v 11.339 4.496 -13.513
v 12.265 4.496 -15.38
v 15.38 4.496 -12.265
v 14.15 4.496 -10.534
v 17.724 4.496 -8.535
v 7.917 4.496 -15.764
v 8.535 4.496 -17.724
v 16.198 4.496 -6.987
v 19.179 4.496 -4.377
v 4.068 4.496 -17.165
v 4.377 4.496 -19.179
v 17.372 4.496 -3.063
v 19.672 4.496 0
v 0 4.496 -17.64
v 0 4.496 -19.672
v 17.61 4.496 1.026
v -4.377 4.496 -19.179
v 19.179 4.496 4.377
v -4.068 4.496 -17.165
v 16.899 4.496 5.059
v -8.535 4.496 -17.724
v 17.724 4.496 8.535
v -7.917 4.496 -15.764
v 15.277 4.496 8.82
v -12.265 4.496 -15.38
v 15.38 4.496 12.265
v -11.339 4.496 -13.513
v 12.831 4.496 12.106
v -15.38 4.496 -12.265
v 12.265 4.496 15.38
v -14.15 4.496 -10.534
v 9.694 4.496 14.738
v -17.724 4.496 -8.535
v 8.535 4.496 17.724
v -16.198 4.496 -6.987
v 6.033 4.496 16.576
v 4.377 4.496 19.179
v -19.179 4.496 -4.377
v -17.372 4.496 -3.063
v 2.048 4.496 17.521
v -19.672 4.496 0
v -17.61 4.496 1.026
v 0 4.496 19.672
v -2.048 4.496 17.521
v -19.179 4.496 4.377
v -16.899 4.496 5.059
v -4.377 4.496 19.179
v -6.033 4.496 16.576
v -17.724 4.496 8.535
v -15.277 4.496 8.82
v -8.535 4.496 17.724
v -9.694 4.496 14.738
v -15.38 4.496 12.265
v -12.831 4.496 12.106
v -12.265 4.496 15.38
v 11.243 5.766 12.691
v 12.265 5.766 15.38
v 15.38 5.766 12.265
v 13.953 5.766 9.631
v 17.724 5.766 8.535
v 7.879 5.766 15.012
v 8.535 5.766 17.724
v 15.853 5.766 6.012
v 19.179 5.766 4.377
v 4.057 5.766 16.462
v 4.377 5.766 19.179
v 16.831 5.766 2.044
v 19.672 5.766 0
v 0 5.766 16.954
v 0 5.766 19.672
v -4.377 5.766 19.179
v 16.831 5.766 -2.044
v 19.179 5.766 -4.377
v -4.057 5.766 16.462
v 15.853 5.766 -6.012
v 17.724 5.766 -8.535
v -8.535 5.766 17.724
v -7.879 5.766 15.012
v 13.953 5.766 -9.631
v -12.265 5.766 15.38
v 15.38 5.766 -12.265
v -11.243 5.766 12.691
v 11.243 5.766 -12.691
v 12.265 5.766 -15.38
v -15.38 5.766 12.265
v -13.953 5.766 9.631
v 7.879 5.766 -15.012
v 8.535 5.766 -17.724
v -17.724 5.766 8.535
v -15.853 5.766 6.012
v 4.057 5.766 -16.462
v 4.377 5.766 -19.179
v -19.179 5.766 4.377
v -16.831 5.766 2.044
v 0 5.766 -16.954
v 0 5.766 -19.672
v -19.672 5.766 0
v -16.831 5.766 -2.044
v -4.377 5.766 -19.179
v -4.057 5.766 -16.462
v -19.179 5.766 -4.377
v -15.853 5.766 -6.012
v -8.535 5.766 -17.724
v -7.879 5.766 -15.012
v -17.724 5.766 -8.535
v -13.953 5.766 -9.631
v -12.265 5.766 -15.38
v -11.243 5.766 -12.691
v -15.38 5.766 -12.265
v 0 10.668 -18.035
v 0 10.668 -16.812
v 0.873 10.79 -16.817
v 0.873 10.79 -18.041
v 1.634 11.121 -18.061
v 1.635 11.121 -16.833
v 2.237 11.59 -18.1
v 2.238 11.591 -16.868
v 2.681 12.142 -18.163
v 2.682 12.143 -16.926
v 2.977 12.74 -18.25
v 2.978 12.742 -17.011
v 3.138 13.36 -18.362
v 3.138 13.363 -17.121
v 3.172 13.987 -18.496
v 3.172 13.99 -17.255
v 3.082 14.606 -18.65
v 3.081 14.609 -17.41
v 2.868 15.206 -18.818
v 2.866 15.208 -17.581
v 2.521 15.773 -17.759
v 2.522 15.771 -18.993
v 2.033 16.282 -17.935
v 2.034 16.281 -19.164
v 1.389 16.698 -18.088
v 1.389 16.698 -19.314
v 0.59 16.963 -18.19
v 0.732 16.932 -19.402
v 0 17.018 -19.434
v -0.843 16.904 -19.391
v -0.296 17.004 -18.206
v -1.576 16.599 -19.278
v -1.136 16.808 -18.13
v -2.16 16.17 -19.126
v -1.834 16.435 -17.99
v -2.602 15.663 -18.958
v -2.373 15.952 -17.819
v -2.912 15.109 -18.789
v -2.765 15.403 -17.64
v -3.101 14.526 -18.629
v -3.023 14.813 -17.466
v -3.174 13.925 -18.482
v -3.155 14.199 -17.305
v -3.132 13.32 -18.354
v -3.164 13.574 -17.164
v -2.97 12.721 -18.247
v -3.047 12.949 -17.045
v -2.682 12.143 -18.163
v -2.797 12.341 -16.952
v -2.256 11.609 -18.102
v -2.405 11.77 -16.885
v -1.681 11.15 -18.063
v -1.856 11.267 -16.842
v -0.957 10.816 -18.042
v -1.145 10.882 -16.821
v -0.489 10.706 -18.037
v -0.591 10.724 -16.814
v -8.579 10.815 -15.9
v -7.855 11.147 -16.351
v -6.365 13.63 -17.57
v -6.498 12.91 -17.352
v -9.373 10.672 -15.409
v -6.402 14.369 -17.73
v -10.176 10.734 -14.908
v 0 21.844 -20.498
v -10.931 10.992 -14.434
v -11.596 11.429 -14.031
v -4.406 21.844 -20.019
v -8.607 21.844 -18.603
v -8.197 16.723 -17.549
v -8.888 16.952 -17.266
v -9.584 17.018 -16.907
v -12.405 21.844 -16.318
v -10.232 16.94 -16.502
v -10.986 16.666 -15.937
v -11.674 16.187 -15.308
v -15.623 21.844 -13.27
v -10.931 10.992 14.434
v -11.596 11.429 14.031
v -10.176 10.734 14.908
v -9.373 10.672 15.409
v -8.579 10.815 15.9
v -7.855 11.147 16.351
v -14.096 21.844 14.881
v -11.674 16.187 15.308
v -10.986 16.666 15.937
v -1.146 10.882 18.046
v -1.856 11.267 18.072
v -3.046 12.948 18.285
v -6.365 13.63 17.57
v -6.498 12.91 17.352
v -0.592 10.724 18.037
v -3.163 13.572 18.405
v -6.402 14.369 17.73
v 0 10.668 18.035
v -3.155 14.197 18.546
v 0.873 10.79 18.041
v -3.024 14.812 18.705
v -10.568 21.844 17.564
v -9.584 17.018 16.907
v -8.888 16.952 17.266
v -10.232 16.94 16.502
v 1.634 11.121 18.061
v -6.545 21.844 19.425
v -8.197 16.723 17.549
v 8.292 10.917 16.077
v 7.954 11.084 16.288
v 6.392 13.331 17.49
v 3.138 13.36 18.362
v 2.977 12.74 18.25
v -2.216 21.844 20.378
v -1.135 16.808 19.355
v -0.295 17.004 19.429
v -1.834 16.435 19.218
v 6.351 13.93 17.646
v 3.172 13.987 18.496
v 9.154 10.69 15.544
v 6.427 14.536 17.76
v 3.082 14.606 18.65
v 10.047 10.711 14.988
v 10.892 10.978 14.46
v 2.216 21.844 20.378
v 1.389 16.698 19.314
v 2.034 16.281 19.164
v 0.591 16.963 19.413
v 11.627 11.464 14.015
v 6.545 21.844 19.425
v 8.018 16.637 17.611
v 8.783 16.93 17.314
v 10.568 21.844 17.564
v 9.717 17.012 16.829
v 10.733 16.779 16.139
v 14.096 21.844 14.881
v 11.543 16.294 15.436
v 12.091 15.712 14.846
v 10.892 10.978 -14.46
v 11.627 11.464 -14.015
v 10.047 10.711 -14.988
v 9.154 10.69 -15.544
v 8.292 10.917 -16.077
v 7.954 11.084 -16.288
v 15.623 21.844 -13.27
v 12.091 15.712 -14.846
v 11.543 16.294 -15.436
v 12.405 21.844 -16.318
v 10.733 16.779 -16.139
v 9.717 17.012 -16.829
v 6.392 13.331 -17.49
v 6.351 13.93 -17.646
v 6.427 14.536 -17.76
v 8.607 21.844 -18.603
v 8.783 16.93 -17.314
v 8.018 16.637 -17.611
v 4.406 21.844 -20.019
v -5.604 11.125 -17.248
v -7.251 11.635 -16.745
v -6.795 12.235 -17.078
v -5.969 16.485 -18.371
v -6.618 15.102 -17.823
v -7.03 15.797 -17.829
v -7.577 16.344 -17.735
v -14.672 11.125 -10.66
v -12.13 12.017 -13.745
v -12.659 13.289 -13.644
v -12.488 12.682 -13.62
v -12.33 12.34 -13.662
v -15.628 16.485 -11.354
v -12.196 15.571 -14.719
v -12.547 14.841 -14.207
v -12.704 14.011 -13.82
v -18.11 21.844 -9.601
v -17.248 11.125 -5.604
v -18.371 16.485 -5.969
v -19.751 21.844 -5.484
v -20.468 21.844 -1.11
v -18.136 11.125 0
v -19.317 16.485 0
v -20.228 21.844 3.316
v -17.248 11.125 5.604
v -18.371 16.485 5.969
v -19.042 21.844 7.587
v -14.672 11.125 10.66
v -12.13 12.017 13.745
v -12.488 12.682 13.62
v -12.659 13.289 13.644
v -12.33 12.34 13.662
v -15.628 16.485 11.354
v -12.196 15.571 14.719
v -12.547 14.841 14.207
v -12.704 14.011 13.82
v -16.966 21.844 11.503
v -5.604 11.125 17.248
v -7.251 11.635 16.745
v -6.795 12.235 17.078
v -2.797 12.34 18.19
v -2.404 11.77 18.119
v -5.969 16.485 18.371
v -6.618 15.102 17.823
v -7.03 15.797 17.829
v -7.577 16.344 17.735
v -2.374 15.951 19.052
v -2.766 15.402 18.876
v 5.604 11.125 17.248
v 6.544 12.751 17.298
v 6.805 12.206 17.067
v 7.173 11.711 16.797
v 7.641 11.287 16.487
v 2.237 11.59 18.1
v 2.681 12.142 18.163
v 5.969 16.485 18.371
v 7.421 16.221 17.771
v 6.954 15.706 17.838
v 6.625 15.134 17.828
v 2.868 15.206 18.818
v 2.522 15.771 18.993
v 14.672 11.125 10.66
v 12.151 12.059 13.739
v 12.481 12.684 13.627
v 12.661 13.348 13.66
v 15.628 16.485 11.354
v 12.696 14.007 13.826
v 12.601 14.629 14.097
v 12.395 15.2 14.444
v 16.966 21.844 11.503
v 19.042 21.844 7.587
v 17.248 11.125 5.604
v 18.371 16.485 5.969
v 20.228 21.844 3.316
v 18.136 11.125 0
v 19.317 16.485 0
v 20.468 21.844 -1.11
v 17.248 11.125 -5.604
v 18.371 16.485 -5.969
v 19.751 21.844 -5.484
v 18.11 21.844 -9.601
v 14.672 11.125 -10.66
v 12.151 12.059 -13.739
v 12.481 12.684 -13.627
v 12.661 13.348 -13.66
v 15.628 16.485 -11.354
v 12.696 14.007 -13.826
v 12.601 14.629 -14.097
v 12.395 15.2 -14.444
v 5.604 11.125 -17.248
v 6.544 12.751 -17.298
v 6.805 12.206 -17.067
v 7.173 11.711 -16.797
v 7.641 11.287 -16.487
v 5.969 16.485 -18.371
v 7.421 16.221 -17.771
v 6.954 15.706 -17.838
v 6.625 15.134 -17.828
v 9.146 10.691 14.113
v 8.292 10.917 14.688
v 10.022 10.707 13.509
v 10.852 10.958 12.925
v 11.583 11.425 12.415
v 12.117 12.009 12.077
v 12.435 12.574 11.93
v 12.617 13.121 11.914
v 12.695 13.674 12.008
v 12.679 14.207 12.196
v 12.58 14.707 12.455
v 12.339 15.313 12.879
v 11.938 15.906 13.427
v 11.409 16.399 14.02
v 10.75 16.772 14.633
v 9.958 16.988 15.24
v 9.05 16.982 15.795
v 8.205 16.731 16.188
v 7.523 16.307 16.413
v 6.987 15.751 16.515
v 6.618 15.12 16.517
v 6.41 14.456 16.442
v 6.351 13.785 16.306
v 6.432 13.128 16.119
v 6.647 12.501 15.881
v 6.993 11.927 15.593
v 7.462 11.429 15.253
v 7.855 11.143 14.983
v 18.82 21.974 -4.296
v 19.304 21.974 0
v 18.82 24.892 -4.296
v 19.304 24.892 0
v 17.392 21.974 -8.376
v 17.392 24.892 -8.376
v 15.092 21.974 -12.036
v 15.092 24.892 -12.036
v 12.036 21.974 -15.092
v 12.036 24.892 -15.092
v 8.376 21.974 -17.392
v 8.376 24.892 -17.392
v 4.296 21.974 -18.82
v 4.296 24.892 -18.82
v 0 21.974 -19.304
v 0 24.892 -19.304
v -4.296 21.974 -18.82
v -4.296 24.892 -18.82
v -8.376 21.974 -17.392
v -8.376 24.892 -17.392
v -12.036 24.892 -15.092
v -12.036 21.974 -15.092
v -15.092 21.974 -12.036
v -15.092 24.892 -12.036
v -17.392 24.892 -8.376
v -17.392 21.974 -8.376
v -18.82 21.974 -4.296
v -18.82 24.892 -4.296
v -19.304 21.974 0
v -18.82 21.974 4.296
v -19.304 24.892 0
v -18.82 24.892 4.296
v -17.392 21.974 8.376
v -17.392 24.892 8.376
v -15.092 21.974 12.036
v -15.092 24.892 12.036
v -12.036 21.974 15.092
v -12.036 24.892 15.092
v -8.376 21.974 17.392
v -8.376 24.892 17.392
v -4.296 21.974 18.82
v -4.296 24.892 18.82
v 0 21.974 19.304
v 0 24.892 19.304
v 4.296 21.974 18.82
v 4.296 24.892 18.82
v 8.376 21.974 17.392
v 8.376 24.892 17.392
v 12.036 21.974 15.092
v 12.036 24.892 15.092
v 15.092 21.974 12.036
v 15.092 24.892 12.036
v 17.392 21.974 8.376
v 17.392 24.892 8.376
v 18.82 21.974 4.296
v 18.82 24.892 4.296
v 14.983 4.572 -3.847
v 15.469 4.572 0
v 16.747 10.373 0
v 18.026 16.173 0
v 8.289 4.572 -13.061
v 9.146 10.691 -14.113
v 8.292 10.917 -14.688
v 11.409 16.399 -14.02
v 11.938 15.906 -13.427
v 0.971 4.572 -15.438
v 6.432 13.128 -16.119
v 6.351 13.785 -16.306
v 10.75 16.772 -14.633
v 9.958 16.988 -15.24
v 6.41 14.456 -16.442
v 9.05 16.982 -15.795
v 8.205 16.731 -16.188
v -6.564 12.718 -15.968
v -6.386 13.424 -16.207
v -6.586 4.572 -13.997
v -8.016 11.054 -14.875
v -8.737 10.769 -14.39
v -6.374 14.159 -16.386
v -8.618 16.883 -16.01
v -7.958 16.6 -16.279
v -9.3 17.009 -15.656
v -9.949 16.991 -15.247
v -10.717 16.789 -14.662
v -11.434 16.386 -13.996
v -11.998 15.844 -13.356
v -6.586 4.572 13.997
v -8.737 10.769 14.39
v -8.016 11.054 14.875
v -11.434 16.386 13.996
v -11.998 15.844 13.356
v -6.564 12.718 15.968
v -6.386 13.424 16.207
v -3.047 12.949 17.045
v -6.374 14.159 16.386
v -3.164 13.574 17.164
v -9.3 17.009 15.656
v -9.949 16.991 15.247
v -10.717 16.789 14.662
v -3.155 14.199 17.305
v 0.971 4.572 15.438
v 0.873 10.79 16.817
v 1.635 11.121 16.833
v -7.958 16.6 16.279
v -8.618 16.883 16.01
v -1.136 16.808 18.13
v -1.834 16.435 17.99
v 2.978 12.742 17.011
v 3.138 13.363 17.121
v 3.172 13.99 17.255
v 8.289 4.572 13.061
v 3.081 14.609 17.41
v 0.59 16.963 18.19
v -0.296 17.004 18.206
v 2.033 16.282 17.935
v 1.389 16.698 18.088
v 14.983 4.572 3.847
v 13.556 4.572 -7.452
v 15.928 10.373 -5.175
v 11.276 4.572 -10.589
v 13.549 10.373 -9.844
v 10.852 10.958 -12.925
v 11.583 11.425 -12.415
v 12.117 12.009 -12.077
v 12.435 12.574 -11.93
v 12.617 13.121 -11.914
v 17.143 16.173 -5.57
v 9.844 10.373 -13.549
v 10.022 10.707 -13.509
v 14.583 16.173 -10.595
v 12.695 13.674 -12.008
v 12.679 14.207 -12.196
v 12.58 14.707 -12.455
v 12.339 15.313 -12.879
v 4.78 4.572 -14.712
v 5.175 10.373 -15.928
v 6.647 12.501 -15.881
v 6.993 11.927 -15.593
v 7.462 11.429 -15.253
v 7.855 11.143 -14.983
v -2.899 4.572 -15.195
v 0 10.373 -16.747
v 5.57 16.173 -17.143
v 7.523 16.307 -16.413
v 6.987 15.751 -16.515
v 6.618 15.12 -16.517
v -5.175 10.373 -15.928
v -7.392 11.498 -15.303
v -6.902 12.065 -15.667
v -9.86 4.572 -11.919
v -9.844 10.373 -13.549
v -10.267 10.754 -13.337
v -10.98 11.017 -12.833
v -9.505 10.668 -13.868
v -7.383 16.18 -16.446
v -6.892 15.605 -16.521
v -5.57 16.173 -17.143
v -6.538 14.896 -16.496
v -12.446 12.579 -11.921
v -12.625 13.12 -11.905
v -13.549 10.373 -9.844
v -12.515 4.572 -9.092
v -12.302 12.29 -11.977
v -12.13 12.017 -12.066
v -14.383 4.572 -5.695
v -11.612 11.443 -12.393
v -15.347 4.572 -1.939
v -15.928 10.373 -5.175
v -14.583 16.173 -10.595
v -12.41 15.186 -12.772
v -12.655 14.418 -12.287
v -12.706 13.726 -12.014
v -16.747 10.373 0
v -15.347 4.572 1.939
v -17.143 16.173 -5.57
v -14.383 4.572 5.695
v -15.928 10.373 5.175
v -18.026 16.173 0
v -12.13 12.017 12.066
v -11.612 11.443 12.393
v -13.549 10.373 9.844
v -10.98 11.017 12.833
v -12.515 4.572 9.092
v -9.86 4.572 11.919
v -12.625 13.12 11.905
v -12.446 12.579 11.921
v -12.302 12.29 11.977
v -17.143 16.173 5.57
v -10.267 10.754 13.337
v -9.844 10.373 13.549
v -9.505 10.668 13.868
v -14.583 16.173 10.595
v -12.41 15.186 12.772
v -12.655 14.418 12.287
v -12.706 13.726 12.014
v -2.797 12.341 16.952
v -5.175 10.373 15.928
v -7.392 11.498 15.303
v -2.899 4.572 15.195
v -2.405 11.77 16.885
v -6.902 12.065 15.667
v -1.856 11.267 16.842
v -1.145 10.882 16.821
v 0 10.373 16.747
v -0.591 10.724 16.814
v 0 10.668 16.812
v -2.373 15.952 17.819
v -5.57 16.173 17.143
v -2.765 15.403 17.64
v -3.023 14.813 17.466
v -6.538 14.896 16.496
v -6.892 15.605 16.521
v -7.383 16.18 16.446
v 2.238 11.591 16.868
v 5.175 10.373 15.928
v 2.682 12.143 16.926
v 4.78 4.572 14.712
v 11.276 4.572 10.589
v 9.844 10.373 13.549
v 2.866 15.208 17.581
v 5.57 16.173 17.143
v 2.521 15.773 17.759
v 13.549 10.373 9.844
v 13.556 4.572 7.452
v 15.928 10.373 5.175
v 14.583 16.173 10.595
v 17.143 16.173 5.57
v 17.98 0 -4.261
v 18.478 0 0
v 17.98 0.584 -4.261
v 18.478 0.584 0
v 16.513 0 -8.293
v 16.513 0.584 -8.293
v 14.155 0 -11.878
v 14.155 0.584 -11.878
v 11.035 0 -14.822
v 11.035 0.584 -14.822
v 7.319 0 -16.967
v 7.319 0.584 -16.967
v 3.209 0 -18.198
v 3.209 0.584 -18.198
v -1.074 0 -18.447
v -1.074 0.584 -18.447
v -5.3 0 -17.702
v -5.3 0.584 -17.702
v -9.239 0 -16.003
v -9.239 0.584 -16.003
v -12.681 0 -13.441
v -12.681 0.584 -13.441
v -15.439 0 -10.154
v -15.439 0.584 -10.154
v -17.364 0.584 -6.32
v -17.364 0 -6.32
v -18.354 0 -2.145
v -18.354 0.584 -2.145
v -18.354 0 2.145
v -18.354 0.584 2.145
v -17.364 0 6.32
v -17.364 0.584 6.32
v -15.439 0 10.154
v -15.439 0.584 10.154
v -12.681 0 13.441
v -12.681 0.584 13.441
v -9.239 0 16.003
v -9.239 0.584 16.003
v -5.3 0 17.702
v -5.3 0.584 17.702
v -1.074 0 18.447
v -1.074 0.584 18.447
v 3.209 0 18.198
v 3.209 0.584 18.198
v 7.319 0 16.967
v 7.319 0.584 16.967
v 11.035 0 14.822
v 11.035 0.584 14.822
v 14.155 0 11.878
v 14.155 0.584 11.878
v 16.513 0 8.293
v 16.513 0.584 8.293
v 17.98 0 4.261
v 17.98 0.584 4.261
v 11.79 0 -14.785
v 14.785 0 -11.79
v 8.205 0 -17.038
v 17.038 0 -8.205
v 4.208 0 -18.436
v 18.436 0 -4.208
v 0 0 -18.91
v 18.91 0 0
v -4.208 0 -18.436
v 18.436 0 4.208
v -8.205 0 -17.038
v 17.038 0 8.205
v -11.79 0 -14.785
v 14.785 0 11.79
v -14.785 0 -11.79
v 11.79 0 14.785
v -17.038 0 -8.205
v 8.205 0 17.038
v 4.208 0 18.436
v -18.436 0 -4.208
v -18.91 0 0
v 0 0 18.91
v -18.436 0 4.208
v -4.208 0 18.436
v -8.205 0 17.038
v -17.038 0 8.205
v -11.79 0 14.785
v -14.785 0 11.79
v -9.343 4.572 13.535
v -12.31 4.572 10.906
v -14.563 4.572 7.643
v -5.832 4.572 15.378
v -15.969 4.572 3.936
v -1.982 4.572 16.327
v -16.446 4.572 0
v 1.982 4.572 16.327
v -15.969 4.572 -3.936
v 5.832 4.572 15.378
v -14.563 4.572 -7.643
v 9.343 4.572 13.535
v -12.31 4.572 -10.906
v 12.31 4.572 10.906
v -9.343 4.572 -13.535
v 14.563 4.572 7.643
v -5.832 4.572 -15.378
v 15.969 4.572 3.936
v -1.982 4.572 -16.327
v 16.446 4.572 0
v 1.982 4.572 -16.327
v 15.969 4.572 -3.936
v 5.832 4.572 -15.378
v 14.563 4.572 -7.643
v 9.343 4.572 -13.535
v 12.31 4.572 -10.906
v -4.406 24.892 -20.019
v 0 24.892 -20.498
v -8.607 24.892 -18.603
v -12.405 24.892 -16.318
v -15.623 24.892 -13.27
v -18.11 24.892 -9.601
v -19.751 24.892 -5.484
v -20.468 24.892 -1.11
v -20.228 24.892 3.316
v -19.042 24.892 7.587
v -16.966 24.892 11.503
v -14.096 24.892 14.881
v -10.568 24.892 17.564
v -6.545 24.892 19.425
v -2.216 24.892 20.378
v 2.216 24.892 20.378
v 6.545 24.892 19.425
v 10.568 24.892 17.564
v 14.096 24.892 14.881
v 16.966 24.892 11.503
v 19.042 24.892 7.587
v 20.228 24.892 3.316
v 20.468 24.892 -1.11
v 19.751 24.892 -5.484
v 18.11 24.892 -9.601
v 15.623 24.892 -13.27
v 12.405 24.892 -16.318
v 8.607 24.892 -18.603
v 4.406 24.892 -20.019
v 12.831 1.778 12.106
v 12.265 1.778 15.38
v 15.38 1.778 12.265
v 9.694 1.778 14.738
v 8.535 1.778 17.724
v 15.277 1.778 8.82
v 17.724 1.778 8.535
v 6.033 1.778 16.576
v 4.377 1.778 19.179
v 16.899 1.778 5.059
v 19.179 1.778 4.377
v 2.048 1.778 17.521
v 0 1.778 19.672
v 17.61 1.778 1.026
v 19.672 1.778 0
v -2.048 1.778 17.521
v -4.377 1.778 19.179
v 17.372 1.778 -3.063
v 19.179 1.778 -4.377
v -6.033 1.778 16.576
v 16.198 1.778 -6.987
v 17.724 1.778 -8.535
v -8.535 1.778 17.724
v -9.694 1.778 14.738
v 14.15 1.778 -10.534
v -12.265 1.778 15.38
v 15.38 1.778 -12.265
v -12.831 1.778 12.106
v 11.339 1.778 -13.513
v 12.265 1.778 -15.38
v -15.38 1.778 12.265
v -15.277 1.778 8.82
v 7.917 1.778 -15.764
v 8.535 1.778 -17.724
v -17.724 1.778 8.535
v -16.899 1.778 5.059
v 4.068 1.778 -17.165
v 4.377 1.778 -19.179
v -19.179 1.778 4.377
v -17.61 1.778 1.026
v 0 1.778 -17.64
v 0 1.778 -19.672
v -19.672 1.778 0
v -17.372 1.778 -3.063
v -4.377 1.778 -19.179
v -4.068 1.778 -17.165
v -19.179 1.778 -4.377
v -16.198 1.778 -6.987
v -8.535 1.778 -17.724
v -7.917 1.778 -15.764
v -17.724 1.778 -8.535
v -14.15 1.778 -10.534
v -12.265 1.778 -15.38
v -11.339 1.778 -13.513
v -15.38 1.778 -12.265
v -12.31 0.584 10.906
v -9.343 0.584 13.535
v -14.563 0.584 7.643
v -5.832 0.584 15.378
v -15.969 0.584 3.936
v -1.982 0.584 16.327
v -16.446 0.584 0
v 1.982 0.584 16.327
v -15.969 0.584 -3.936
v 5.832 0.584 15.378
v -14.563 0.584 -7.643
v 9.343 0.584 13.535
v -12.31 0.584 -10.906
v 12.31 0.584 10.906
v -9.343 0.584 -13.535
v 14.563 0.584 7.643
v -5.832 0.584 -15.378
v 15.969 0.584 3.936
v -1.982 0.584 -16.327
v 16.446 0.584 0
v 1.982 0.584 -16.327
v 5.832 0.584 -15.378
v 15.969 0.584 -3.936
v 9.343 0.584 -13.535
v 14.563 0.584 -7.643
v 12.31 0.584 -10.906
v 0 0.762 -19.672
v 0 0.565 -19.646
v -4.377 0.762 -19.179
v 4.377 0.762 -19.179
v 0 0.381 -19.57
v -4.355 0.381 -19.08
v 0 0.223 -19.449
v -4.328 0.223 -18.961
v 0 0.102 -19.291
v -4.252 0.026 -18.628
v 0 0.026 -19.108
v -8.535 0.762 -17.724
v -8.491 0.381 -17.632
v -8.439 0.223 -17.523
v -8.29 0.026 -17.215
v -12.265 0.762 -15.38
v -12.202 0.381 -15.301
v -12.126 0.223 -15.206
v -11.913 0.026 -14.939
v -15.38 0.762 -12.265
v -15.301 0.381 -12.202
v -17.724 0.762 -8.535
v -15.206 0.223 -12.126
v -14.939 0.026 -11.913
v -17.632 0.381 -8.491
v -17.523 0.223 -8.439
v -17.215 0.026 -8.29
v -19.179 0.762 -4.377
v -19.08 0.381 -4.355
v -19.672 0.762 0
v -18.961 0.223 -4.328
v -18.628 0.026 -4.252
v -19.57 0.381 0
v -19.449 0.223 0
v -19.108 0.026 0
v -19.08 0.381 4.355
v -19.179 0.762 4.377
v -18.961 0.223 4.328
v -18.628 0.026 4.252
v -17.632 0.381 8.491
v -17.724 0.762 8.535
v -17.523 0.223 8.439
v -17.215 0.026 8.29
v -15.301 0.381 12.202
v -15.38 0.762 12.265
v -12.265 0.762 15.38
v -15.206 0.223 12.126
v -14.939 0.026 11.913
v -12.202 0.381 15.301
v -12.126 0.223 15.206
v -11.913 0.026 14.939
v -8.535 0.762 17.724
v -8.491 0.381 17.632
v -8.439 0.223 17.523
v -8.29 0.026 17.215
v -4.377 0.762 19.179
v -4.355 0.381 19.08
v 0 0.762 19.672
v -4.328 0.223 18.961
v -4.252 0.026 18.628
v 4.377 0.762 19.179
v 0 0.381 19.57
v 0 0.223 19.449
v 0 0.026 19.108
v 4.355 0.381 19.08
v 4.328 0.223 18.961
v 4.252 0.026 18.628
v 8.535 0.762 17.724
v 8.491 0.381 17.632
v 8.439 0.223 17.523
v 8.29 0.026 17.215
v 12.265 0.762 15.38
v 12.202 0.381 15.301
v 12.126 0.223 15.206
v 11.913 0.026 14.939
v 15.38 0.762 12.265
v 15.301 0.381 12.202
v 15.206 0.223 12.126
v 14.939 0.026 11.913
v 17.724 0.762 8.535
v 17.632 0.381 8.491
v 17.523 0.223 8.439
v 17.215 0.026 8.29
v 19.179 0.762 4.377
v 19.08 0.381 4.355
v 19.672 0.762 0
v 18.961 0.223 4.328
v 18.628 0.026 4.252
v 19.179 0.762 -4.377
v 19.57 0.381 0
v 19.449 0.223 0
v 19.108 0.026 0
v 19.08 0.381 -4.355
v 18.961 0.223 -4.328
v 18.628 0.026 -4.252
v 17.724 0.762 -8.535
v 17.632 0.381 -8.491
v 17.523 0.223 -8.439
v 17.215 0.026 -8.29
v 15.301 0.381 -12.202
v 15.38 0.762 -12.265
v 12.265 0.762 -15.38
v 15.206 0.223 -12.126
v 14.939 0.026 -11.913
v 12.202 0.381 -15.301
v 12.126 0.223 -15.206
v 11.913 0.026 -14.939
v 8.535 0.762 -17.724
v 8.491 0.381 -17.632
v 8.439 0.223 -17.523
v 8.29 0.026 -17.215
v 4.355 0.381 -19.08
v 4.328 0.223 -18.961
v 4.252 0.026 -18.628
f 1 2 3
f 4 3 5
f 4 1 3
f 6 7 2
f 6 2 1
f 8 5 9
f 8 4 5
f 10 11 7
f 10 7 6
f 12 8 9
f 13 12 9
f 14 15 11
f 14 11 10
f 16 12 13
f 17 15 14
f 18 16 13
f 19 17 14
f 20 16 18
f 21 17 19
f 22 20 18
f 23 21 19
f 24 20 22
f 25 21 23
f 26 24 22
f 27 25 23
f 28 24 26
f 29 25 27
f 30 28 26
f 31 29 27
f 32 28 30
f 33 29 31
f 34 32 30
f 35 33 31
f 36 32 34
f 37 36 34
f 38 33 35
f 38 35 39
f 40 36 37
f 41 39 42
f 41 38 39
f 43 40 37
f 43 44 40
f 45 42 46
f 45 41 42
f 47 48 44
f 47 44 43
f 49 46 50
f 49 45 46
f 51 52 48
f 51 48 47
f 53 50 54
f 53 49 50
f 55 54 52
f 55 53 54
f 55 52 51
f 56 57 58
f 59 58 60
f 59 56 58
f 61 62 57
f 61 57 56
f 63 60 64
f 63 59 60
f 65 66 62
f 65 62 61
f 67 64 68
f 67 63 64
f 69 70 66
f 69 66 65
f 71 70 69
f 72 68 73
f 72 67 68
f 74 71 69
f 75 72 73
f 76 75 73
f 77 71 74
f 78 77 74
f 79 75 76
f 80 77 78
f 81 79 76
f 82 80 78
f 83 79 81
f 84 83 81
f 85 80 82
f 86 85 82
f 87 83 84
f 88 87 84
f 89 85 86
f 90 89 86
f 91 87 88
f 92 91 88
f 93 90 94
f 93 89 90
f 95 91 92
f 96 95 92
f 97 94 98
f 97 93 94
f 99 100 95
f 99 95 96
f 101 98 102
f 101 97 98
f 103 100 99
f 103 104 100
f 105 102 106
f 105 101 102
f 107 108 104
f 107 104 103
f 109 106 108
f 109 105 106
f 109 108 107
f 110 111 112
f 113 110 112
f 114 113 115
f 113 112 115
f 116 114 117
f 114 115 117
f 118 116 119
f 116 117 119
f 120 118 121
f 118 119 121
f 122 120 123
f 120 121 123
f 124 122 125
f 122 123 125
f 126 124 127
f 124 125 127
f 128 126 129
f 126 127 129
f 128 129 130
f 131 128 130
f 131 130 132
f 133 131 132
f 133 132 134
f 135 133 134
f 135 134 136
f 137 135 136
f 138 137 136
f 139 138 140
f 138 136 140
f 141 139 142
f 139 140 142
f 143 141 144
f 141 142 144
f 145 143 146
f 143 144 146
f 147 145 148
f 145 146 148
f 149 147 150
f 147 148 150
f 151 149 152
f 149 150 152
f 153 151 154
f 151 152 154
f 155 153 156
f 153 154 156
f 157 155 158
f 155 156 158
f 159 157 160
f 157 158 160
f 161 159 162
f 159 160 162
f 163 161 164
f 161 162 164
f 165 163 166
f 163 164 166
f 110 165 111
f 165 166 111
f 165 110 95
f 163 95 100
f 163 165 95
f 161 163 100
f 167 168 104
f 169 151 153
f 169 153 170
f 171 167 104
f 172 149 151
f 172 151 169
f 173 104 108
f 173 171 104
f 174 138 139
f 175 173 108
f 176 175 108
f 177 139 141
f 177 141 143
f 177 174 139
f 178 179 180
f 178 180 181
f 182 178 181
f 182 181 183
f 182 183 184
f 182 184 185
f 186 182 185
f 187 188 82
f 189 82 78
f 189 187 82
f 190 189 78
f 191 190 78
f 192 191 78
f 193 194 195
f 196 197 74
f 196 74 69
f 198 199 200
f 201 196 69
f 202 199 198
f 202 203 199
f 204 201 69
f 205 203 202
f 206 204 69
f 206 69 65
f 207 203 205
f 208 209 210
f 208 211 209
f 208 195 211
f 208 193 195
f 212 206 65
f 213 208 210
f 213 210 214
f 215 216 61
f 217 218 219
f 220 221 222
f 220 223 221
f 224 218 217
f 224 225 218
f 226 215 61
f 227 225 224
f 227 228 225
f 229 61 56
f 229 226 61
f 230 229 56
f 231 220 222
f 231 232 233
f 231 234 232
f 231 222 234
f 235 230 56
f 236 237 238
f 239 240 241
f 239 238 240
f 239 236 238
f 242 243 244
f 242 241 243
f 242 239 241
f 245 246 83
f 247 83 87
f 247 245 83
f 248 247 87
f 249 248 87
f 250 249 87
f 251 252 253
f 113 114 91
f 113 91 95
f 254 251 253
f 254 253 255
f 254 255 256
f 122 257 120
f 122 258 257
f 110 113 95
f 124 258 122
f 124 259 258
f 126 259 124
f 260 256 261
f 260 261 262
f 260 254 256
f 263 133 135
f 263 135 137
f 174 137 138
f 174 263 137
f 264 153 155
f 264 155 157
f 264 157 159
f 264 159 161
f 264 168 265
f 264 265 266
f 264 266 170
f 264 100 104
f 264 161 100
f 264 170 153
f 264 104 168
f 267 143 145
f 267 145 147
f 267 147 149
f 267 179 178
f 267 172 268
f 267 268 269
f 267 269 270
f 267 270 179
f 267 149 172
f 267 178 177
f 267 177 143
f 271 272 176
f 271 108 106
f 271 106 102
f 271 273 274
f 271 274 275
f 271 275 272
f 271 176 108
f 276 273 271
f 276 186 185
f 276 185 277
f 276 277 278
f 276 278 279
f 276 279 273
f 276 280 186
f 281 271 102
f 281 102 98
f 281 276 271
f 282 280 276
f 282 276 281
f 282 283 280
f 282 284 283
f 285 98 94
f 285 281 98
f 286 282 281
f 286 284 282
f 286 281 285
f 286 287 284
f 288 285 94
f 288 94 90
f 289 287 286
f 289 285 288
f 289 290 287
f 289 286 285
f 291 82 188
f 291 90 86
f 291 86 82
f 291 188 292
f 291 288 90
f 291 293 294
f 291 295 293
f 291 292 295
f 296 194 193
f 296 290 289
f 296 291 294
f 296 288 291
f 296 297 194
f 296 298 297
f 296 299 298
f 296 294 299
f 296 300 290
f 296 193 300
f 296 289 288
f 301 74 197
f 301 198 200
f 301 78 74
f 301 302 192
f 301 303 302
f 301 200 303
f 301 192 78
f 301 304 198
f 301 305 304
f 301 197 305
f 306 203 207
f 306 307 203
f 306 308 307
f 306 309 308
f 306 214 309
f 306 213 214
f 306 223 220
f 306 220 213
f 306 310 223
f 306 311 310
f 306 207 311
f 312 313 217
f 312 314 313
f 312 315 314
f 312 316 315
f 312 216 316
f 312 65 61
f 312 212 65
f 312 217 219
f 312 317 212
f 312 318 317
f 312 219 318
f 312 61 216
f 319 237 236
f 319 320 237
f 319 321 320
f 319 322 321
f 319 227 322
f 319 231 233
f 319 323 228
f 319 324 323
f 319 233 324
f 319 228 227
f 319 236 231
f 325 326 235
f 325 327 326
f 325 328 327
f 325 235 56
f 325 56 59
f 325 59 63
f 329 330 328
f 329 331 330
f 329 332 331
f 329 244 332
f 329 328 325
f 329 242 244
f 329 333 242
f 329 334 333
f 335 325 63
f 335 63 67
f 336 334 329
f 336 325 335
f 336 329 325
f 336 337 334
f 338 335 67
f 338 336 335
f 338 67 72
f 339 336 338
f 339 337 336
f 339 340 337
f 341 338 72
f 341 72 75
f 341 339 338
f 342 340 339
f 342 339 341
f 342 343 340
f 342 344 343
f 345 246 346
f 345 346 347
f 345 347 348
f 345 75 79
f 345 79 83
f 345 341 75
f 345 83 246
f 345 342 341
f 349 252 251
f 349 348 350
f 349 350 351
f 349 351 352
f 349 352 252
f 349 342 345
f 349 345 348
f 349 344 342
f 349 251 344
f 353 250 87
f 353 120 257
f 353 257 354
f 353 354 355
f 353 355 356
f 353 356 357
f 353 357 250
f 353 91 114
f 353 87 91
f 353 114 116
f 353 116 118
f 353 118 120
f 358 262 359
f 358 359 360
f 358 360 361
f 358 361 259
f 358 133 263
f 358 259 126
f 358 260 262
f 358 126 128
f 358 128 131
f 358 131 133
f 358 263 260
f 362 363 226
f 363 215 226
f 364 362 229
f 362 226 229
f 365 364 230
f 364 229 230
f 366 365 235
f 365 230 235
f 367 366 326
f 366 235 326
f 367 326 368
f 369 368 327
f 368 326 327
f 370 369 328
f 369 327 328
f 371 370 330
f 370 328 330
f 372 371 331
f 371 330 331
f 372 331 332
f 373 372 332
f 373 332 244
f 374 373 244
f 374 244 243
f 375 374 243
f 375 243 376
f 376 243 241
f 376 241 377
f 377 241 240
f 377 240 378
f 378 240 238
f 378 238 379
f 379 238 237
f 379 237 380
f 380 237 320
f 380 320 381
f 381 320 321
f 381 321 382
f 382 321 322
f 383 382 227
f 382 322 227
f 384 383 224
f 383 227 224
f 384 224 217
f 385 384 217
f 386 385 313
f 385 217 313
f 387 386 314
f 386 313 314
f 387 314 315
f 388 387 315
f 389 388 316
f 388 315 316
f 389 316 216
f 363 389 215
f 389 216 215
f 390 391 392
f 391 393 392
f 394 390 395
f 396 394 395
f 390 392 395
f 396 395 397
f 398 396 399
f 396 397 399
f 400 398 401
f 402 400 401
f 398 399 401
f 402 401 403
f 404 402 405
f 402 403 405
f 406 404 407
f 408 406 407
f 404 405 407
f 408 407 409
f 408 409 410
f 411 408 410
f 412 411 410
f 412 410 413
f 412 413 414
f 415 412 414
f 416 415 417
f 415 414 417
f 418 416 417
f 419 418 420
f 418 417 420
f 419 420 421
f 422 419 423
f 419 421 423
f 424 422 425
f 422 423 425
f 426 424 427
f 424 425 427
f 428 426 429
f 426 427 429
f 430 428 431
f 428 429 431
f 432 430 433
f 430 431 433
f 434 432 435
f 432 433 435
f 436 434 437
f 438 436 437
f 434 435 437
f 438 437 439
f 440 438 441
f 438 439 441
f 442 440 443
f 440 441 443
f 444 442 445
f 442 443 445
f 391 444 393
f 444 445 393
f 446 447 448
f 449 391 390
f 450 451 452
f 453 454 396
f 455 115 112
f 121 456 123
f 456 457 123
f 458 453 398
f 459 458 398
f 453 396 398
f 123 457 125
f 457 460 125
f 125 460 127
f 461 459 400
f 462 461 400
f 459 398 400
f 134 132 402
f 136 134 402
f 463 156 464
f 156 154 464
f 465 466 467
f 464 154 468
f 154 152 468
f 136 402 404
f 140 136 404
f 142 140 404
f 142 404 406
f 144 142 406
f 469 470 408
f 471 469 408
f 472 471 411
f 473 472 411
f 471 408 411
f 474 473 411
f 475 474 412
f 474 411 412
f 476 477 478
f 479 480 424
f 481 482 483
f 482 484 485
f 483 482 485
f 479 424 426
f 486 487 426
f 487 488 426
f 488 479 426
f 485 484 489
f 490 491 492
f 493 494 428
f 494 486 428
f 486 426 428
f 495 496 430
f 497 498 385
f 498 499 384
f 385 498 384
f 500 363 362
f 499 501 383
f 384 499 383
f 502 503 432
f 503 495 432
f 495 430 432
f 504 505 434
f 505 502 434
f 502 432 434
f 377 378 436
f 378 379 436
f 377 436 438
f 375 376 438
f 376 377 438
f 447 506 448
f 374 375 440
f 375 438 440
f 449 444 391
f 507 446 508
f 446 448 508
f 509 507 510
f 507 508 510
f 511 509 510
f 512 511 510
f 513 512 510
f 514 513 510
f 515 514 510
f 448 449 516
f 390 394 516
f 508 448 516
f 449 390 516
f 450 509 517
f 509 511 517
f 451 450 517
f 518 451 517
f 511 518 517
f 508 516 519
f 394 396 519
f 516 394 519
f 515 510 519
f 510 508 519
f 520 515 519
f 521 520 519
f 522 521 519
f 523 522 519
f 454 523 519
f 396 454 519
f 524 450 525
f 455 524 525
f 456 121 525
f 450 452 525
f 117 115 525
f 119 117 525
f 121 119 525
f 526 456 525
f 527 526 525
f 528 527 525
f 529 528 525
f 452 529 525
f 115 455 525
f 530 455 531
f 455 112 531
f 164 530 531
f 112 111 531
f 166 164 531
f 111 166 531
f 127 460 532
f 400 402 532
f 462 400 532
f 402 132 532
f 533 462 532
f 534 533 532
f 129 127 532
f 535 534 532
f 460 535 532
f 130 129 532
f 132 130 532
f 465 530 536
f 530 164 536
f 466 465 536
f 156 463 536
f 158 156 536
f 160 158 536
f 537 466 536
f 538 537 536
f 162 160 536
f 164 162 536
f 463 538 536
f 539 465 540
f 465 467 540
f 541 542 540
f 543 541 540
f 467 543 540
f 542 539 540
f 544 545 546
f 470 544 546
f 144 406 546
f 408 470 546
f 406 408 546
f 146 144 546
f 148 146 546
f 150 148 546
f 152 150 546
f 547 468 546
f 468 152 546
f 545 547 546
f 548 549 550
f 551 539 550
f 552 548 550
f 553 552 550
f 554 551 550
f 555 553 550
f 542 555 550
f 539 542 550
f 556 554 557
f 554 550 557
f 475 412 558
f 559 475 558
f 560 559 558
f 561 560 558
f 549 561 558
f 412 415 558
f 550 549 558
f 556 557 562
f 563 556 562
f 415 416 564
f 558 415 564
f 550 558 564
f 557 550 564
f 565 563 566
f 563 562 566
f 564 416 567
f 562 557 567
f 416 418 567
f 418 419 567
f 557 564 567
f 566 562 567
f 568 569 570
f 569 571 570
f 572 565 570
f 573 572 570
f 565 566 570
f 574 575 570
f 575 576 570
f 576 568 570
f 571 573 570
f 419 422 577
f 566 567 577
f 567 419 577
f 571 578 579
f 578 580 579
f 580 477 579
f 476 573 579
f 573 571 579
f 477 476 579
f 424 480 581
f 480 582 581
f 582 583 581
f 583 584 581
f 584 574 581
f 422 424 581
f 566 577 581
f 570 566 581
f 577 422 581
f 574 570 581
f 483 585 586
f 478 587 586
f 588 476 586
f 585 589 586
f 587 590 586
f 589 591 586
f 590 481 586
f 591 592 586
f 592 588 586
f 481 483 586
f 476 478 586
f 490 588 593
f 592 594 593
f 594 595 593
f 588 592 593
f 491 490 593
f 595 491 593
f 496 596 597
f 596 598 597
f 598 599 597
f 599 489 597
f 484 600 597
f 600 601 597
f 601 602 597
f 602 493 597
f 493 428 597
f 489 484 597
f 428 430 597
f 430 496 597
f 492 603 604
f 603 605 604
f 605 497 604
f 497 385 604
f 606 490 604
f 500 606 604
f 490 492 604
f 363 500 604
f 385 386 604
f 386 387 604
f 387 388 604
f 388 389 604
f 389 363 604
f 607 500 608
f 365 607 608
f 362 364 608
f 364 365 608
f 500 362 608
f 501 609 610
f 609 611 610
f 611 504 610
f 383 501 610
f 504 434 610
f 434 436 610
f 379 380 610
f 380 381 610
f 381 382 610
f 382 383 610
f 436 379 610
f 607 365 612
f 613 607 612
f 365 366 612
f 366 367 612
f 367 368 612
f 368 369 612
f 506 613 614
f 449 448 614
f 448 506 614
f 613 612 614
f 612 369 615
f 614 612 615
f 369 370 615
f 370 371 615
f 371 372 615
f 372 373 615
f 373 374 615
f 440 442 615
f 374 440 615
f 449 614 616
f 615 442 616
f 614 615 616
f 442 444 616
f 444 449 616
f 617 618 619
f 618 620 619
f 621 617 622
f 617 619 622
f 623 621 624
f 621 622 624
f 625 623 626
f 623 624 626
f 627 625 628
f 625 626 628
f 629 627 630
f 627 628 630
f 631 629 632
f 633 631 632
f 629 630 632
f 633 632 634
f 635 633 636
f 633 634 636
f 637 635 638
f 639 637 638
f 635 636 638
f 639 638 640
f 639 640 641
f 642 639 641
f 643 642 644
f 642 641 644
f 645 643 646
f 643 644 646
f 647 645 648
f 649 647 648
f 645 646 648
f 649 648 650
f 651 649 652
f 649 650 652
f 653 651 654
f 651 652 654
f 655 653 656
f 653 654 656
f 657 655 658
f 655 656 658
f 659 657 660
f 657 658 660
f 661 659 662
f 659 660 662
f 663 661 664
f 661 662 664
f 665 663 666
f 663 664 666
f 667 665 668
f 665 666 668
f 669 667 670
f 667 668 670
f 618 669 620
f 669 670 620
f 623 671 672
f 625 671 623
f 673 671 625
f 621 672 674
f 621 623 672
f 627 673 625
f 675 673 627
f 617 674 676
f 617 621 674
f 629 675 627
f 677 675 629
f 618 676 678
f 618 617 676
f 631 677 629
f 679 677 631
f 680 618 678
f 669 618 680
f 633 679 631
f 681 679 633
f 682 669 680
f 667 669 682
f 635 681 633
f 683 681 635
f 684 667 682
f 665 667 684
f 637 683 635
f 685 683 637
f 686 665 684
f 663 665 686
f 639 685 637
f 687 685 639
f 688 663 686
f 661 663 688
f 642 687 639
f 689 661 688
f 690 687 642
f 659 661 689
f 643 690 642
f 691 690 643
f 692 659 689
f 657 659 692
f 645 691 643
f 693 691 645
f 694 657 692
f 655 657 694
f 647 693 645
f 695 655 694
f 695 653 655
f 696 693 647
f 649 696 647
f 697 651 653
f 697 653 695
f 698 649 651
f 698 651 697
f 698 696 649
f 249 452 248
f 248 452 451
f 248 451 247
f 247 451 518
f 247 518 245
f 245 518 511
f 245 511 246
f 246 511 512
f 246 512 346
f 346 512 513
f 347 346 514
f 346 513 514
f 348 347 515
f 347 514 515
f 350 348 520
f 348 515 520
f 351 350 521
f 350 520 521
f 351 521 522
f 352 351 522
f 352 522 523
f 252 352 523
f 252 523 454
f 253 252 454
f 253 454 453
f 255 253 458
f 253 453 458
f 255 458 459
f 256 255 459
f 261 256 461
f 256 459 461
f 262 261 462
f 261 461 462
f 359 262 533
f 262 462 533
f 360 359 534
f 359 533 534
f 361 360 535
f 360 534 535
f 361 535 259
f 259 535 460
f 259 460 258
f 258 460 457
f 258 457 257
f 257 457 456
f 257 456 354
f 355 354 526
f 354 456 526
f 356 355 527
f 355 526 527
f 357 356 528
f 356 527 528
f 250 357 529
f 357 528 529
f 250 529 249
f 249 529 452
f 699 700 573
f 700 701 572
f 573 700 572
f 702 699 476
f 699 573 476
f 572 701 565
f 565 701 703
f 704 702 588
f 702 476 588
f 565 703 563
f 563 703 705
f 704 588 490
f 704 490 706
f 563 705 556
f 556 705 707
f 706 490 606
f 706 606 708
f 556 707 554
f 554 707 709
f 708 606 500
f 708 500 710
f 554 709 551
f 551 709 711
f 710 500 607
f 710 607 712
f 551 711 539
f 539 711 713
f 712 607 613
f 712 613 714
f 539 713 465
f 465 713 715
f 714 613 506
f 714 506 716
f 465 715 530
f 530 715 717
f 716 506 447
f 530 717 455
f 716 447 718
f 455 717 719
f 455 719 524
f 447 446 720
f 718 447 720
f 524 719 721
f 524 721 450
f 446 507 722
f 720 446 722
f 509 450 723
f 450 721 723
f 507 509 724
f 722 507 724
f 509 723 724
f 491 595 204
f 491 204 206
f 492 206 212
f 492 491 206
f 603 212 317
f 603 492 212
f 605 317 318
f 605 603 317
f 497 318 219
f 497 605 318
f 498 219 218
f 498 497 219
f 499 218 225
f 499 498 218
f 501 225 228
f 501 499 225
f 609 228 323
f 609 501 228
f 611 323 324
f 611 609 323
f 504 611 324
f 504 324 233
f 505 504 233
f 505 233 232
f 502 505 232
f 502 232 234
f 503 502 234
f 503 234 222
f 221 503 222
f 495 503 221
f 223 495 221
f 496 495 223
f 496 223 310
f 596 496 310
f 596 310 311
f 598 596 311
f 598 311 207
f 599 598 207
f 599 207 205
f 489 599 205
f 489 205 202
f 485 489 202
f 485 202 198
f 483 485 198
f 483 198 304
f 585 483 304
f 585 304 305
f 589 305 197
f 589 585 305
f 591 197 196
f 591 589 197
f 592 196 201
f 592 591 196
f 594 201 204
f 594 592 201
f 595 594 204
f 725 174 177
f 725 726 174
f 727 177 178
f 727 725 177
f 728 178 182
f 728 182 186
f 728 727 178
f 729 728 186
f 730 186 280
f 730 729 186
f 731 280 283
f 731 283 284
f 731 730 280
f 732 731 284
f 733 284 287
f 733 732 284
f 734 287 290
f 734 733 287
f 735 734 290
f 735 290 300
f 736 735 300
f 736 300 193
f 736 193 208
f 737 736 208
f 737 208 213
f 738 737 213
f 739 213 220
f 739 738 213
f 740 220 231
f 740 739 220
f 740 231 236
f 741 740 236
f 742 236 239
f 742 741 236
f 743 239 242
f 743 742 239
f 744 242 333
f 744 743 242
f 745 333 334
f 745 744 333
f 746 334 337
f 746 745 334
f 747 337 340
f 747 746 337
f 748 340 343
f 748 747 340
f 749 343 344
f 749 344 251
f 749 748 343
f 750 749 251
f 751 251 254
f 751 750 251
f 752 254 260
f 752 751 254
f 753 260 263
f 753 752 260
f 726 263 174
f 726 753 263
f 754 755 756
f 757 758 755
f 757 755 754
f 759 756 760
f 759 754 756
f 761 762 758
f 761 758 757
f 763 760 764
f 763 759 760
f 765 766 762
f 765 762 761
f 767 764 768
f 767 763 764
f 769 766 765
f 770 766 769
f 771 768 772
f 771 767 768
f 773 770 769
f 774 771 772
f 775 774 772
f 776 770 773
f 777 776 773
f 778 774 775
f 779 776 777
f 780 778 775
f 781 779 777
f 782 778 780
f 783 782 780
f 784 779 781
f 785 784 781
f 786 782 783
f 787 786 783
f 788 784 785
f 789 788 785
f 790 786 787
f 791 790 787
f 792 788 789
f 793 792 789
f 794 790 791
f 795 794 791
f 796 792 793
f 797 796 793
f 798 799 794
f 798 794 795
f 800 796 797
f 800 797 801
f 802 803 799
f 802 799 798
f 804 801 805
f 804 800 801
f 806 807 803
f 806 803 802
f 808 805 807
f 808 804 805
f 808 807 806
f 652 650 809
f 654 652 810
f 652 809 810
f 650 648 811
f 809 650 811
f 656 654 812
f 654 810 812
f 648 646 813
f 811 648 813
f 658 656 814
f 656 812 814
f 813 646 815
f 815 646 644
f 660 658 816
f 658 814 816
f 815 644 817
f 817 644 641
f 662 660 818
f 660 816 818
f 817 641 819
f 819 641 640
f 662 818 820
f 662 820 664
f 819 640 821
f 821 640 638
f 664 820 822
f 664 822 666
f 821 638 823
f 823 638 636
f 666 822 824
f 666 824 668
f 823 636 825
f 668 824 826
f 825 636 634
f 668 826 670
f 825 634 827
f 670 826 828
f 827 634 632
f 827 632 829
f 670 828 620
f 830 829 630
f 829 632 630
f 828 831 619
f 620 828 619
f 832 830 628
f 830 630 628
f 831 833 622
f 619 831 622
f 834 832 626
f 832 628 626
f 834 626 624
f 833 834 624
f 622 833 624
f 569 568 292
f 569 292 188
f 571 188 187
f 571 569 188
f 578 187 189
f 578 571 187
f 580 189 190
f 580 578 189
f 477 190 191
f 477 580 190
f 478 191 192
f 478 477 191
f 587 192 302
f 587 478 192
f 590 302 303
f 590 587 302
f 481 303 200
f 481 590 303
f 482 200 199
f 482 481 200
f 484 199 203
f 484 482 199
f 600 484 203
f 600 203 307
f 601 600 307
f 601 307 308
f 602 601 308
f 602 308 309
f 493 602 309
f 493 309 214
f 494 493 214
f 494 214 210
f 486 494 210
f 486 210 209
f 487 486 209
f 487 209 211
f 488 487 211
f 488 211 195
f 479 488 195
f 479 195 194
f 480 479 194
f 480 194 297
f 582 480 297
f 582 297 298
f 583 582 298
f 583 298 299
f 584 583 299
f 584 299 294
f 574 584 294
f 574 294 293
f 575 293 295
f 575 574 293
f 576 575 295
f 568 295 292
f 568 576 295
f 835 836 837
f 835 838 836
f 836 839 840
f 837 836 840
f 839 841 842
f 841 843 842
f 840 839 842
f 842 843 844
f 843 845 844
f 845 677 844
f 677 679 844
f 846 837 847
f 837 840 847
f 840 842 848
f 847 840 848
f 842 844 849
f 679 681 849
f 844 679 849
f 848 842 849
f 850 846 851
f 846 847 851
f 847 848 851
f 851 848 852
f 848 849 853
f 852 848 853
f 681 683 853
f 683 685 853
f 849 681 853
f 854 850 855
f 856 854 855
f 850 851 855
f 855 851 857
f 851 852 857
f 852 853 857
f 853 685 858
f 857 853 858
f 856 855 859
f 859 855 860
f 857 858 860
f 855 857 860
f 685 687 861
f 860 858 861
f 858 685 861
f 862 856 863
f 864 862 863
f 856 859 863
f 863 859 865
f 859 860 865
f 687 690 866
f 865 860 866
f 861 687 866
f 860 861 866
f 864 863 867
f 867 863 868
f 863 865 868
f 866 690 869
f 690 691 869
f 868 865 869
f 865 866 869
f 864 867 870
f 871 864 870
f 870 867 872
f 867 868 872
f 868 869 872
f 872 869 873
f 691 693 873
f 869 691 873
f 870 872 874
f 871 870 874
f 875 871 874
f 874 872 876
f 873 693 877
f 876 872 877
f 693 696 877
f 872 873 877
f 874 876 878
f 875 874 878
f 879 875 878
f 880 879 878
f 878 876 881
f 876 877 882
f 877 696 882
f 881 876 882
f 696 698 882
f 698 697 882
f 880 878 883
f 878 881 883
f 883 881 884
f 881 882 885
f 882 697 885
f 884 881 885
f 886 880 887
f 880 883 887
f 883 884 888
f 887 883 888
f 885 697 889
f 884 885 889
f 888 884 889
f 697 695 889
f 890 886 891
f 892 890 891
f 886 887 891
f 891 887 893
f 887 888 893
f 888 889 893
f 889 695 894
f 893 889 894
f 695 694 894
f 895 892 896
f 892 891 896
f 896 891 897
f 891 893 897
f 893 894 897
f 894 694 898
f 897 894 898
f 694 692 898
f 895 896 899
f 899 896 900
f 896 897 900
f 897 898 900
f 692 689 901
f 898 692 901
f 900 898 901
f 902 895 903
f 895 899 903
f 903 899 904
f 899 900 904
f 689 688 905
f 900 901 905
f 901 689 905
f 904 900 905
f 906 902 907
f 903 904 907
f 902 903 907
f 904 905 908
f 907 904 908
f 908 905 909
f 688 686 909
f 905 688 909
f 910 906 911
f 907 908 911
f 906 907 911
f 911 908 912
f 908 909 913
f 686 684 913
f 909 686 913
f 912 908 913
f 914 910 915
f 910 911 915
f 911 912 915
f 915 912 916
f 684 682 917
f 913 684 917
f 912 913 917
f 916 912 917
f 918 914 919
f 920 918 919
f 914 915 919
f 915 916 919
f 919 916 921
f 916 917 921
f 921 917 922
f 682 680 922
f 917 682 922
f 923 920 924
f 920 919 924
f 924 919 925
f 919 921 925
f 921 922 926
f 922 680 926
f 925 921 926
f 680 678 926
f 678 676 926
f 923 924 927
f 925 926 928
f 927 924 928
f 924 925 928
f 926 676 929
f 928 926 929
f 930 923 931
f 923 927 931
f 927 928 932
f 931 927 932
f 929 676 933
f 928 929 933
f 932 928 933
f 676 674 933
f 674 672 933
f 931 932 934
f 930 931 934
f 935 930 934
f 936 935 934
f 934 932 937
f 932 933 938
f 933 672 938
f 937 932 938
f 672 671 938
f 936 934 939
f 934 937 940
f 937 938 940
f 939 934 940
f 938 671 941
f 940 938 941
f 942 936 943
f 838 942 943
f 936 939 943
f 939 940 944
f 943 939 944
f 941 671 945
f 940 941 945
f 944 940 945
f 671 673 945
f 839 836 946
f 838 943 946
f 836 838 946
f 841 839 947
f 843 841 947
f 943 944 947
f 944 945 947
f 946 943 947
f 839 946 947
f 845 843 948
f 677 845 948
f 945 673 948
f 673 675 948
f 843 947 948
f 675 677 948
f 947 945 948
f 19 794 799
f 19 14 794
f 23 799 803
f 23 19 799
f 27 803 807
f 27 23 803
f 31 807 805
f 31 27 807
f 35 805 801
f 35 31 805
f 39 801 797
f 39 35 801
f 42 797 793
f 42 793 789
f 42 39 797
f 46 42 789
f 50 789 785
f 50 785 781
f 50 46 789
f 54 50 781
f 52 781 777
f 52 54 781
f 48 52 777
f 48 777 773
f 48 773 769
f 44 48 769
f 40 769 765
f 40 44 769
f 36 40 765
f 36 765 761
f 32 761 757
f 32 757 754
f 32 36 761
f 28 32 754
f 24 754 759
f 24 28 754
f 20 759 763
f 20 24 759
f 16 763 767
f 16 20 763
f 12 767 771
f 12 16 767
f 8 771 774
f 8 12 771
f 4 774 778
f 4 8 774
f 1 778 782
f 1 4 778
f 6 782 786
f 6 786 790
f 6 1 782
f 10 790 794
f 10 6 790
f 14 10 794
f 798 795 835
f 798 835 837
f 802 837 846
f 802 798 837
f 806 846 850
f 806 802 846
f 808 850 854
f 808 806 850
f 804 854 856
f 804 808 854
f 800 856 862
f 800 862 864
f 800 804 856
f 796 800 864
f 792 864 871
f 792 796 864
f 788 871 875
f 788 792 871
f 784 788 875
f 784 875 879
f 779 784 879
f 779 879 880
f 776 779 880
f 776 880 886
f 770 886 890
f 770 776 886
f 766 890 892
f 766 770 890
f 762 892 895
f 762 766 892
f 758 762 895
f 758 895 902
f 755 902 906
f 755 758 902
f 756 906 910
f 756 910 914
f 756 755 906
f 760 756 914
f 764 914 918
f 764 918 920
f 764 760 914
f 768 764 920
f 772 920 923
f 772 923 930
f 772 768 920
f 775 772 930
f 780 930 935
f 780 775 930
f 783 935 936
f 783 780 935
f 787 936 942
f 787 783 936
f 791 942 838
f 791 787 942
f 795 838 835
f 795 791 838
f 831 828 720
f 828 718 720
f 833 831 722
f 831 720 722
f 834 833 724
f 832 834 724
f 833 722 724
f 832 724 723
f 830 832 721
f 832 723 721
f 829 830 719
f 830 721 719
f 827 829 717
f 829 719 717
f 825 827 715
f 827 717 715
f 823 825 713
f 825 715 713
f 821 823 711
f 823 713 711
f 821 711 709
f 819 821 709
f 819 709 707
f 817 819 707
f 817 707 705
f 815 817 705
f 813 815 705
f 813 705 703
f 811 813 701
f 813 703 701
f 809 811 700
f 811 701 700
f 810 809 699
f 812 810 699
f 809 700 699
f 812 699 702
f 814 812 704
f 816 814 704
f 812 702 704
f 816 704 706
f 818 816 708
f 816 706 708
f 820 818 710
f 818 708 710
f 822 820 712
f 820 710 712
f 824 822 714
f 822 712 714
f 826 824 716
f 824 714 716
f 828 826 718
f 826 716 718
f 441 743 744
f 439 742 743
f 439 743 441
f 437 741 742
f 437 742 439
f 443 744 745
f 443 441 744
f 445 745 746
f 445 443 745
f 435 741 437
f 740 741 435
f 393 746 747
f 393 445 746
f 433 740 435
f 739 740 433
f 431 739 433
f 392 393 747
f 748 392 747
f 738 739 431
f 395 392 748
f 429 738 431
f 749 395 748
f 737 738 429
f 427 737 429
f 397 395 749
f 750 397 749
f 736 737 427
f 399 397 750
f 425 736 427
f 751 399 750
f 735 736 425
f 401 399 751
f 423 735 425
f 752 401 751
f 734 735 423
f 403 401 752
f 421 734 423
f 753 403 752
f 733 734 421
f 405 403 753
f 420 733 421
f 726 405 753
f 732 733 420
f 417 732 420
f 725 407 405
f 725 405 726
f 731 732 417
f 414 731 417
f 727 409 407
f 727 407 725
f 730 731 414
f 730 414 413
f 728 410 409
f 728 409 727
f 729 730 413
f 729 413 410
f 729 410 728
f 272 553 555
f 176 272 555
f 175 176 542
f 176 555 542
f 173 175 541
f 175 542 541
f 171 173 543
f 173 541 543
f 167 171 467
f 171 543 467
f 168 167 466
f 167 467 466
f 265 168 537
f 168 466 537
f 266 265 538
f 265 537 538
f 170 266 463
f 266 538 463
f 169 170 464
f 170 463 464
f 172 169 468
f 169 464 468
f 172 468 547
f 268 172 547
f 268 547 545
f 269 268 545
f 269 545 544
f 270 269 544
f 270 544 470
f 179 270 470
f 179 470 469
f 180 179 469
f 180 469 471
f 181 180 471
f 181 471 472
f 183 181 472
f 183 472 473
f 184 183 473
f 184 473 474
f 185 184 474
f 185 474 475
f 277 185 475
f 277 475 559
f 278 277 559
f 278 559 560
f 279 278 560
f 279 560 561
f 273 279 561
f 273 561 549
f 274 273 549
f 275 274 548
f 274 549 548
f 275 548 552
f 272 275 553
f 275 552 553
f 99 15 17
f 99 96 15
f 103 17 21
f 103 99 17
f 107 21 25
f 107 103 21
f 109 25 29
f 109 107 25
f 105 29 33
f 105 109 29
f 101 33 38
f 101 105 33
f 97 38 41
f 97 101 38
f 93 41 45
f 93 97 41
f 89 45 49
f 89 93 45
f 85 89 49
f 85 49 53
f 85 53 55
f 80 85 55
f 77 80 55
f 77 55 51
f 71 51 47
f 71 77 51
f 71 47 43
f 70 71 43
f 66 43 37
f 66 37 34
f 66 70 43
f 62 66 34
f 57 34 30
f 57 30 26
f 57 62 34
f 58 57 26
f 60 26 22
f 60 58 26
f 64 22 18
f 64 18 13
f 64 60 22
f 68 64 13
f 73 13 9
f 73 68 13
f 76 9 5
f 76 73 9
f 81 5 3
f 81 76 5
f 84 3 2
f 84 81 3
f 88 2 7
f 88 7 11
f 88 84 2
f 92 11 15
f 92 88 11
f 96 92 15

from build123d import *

# Parameters (mm, degrees)
FILLET1_R          = 0.762
SKETCH2_R          = 3.175
CUT_EXTRUDE1_DEPTH = 21.59


# Read off the part's stored shape, not the designer's step: Shell1
with BuildPart() as part:
    # Sketch1 → Revolve1 (revolve)
    with BuildSketch(Plane.XY, mode=Mode.PRIVATE) as revolve1_sk:
        Polygon((19.6723, 0), (19.6723, 1.778), (17.6403, 1.778), (17.6403, 4.4958), (19.6723, 4.4958), (19.6723, 5.7658), (16.9545, 5.7658), (20.4978, 21.844), (20.4978, 24.892), (0, 24.892), (0, 0), align=None)
    revolve(revolve1_sk.sketch.rotate(Axis((0, 0, 0), (0, 1, 0)), 90), axis=Axis((0, 0, 0), (0, 1, 0)))

    # Fillet1
    fillet1_edges = [part.edges().sort_by_distance(p)[0] for p in [
        (0, 0, 19.6723),
    ]]
    fillet(fillet1_edges, radius=FILLET1_R)

    # Shell1 outline → Shell1 (revolve, cut)
    with BuildSketch(Plane.XY):
        Polygon((16.4465, 4.572), (15.468965439, 4.572), (19.304, 21.973984782), (19.304, 24.892), (0, 24.892), (0, 0), (18.4785, 0), (18.4785, 0.5842), (16.4465, 0.5842), align=None)
    revolve(axis=Axis((0, 0, 0), (0, 1, 0)), mode=Mode.SUBTRACT)

    # Sketch2 → Cut-Extrude1 (cut, symmetric)
    with BuildSketch(Plane.XY):
        with Locations(Location((0, 13.843, 0), (0, 0, 270.000000005))):
            Circle(SKETCH2_R)
        with Locations(Location((-9.533032066, 13.843, 0), (0, 0, 215.10740663))):
            Circle(SKETCH2_R)
        with Locations(Location((9.525, 13.843, 0), (0, 0, 247.150680843))):
            Circle(SKETCH2_R)
    extrude(amount=CUT_EXTRUDE1_DEPTH, both=True, mode=Mode.SUBTRACT)


solid = part.part
